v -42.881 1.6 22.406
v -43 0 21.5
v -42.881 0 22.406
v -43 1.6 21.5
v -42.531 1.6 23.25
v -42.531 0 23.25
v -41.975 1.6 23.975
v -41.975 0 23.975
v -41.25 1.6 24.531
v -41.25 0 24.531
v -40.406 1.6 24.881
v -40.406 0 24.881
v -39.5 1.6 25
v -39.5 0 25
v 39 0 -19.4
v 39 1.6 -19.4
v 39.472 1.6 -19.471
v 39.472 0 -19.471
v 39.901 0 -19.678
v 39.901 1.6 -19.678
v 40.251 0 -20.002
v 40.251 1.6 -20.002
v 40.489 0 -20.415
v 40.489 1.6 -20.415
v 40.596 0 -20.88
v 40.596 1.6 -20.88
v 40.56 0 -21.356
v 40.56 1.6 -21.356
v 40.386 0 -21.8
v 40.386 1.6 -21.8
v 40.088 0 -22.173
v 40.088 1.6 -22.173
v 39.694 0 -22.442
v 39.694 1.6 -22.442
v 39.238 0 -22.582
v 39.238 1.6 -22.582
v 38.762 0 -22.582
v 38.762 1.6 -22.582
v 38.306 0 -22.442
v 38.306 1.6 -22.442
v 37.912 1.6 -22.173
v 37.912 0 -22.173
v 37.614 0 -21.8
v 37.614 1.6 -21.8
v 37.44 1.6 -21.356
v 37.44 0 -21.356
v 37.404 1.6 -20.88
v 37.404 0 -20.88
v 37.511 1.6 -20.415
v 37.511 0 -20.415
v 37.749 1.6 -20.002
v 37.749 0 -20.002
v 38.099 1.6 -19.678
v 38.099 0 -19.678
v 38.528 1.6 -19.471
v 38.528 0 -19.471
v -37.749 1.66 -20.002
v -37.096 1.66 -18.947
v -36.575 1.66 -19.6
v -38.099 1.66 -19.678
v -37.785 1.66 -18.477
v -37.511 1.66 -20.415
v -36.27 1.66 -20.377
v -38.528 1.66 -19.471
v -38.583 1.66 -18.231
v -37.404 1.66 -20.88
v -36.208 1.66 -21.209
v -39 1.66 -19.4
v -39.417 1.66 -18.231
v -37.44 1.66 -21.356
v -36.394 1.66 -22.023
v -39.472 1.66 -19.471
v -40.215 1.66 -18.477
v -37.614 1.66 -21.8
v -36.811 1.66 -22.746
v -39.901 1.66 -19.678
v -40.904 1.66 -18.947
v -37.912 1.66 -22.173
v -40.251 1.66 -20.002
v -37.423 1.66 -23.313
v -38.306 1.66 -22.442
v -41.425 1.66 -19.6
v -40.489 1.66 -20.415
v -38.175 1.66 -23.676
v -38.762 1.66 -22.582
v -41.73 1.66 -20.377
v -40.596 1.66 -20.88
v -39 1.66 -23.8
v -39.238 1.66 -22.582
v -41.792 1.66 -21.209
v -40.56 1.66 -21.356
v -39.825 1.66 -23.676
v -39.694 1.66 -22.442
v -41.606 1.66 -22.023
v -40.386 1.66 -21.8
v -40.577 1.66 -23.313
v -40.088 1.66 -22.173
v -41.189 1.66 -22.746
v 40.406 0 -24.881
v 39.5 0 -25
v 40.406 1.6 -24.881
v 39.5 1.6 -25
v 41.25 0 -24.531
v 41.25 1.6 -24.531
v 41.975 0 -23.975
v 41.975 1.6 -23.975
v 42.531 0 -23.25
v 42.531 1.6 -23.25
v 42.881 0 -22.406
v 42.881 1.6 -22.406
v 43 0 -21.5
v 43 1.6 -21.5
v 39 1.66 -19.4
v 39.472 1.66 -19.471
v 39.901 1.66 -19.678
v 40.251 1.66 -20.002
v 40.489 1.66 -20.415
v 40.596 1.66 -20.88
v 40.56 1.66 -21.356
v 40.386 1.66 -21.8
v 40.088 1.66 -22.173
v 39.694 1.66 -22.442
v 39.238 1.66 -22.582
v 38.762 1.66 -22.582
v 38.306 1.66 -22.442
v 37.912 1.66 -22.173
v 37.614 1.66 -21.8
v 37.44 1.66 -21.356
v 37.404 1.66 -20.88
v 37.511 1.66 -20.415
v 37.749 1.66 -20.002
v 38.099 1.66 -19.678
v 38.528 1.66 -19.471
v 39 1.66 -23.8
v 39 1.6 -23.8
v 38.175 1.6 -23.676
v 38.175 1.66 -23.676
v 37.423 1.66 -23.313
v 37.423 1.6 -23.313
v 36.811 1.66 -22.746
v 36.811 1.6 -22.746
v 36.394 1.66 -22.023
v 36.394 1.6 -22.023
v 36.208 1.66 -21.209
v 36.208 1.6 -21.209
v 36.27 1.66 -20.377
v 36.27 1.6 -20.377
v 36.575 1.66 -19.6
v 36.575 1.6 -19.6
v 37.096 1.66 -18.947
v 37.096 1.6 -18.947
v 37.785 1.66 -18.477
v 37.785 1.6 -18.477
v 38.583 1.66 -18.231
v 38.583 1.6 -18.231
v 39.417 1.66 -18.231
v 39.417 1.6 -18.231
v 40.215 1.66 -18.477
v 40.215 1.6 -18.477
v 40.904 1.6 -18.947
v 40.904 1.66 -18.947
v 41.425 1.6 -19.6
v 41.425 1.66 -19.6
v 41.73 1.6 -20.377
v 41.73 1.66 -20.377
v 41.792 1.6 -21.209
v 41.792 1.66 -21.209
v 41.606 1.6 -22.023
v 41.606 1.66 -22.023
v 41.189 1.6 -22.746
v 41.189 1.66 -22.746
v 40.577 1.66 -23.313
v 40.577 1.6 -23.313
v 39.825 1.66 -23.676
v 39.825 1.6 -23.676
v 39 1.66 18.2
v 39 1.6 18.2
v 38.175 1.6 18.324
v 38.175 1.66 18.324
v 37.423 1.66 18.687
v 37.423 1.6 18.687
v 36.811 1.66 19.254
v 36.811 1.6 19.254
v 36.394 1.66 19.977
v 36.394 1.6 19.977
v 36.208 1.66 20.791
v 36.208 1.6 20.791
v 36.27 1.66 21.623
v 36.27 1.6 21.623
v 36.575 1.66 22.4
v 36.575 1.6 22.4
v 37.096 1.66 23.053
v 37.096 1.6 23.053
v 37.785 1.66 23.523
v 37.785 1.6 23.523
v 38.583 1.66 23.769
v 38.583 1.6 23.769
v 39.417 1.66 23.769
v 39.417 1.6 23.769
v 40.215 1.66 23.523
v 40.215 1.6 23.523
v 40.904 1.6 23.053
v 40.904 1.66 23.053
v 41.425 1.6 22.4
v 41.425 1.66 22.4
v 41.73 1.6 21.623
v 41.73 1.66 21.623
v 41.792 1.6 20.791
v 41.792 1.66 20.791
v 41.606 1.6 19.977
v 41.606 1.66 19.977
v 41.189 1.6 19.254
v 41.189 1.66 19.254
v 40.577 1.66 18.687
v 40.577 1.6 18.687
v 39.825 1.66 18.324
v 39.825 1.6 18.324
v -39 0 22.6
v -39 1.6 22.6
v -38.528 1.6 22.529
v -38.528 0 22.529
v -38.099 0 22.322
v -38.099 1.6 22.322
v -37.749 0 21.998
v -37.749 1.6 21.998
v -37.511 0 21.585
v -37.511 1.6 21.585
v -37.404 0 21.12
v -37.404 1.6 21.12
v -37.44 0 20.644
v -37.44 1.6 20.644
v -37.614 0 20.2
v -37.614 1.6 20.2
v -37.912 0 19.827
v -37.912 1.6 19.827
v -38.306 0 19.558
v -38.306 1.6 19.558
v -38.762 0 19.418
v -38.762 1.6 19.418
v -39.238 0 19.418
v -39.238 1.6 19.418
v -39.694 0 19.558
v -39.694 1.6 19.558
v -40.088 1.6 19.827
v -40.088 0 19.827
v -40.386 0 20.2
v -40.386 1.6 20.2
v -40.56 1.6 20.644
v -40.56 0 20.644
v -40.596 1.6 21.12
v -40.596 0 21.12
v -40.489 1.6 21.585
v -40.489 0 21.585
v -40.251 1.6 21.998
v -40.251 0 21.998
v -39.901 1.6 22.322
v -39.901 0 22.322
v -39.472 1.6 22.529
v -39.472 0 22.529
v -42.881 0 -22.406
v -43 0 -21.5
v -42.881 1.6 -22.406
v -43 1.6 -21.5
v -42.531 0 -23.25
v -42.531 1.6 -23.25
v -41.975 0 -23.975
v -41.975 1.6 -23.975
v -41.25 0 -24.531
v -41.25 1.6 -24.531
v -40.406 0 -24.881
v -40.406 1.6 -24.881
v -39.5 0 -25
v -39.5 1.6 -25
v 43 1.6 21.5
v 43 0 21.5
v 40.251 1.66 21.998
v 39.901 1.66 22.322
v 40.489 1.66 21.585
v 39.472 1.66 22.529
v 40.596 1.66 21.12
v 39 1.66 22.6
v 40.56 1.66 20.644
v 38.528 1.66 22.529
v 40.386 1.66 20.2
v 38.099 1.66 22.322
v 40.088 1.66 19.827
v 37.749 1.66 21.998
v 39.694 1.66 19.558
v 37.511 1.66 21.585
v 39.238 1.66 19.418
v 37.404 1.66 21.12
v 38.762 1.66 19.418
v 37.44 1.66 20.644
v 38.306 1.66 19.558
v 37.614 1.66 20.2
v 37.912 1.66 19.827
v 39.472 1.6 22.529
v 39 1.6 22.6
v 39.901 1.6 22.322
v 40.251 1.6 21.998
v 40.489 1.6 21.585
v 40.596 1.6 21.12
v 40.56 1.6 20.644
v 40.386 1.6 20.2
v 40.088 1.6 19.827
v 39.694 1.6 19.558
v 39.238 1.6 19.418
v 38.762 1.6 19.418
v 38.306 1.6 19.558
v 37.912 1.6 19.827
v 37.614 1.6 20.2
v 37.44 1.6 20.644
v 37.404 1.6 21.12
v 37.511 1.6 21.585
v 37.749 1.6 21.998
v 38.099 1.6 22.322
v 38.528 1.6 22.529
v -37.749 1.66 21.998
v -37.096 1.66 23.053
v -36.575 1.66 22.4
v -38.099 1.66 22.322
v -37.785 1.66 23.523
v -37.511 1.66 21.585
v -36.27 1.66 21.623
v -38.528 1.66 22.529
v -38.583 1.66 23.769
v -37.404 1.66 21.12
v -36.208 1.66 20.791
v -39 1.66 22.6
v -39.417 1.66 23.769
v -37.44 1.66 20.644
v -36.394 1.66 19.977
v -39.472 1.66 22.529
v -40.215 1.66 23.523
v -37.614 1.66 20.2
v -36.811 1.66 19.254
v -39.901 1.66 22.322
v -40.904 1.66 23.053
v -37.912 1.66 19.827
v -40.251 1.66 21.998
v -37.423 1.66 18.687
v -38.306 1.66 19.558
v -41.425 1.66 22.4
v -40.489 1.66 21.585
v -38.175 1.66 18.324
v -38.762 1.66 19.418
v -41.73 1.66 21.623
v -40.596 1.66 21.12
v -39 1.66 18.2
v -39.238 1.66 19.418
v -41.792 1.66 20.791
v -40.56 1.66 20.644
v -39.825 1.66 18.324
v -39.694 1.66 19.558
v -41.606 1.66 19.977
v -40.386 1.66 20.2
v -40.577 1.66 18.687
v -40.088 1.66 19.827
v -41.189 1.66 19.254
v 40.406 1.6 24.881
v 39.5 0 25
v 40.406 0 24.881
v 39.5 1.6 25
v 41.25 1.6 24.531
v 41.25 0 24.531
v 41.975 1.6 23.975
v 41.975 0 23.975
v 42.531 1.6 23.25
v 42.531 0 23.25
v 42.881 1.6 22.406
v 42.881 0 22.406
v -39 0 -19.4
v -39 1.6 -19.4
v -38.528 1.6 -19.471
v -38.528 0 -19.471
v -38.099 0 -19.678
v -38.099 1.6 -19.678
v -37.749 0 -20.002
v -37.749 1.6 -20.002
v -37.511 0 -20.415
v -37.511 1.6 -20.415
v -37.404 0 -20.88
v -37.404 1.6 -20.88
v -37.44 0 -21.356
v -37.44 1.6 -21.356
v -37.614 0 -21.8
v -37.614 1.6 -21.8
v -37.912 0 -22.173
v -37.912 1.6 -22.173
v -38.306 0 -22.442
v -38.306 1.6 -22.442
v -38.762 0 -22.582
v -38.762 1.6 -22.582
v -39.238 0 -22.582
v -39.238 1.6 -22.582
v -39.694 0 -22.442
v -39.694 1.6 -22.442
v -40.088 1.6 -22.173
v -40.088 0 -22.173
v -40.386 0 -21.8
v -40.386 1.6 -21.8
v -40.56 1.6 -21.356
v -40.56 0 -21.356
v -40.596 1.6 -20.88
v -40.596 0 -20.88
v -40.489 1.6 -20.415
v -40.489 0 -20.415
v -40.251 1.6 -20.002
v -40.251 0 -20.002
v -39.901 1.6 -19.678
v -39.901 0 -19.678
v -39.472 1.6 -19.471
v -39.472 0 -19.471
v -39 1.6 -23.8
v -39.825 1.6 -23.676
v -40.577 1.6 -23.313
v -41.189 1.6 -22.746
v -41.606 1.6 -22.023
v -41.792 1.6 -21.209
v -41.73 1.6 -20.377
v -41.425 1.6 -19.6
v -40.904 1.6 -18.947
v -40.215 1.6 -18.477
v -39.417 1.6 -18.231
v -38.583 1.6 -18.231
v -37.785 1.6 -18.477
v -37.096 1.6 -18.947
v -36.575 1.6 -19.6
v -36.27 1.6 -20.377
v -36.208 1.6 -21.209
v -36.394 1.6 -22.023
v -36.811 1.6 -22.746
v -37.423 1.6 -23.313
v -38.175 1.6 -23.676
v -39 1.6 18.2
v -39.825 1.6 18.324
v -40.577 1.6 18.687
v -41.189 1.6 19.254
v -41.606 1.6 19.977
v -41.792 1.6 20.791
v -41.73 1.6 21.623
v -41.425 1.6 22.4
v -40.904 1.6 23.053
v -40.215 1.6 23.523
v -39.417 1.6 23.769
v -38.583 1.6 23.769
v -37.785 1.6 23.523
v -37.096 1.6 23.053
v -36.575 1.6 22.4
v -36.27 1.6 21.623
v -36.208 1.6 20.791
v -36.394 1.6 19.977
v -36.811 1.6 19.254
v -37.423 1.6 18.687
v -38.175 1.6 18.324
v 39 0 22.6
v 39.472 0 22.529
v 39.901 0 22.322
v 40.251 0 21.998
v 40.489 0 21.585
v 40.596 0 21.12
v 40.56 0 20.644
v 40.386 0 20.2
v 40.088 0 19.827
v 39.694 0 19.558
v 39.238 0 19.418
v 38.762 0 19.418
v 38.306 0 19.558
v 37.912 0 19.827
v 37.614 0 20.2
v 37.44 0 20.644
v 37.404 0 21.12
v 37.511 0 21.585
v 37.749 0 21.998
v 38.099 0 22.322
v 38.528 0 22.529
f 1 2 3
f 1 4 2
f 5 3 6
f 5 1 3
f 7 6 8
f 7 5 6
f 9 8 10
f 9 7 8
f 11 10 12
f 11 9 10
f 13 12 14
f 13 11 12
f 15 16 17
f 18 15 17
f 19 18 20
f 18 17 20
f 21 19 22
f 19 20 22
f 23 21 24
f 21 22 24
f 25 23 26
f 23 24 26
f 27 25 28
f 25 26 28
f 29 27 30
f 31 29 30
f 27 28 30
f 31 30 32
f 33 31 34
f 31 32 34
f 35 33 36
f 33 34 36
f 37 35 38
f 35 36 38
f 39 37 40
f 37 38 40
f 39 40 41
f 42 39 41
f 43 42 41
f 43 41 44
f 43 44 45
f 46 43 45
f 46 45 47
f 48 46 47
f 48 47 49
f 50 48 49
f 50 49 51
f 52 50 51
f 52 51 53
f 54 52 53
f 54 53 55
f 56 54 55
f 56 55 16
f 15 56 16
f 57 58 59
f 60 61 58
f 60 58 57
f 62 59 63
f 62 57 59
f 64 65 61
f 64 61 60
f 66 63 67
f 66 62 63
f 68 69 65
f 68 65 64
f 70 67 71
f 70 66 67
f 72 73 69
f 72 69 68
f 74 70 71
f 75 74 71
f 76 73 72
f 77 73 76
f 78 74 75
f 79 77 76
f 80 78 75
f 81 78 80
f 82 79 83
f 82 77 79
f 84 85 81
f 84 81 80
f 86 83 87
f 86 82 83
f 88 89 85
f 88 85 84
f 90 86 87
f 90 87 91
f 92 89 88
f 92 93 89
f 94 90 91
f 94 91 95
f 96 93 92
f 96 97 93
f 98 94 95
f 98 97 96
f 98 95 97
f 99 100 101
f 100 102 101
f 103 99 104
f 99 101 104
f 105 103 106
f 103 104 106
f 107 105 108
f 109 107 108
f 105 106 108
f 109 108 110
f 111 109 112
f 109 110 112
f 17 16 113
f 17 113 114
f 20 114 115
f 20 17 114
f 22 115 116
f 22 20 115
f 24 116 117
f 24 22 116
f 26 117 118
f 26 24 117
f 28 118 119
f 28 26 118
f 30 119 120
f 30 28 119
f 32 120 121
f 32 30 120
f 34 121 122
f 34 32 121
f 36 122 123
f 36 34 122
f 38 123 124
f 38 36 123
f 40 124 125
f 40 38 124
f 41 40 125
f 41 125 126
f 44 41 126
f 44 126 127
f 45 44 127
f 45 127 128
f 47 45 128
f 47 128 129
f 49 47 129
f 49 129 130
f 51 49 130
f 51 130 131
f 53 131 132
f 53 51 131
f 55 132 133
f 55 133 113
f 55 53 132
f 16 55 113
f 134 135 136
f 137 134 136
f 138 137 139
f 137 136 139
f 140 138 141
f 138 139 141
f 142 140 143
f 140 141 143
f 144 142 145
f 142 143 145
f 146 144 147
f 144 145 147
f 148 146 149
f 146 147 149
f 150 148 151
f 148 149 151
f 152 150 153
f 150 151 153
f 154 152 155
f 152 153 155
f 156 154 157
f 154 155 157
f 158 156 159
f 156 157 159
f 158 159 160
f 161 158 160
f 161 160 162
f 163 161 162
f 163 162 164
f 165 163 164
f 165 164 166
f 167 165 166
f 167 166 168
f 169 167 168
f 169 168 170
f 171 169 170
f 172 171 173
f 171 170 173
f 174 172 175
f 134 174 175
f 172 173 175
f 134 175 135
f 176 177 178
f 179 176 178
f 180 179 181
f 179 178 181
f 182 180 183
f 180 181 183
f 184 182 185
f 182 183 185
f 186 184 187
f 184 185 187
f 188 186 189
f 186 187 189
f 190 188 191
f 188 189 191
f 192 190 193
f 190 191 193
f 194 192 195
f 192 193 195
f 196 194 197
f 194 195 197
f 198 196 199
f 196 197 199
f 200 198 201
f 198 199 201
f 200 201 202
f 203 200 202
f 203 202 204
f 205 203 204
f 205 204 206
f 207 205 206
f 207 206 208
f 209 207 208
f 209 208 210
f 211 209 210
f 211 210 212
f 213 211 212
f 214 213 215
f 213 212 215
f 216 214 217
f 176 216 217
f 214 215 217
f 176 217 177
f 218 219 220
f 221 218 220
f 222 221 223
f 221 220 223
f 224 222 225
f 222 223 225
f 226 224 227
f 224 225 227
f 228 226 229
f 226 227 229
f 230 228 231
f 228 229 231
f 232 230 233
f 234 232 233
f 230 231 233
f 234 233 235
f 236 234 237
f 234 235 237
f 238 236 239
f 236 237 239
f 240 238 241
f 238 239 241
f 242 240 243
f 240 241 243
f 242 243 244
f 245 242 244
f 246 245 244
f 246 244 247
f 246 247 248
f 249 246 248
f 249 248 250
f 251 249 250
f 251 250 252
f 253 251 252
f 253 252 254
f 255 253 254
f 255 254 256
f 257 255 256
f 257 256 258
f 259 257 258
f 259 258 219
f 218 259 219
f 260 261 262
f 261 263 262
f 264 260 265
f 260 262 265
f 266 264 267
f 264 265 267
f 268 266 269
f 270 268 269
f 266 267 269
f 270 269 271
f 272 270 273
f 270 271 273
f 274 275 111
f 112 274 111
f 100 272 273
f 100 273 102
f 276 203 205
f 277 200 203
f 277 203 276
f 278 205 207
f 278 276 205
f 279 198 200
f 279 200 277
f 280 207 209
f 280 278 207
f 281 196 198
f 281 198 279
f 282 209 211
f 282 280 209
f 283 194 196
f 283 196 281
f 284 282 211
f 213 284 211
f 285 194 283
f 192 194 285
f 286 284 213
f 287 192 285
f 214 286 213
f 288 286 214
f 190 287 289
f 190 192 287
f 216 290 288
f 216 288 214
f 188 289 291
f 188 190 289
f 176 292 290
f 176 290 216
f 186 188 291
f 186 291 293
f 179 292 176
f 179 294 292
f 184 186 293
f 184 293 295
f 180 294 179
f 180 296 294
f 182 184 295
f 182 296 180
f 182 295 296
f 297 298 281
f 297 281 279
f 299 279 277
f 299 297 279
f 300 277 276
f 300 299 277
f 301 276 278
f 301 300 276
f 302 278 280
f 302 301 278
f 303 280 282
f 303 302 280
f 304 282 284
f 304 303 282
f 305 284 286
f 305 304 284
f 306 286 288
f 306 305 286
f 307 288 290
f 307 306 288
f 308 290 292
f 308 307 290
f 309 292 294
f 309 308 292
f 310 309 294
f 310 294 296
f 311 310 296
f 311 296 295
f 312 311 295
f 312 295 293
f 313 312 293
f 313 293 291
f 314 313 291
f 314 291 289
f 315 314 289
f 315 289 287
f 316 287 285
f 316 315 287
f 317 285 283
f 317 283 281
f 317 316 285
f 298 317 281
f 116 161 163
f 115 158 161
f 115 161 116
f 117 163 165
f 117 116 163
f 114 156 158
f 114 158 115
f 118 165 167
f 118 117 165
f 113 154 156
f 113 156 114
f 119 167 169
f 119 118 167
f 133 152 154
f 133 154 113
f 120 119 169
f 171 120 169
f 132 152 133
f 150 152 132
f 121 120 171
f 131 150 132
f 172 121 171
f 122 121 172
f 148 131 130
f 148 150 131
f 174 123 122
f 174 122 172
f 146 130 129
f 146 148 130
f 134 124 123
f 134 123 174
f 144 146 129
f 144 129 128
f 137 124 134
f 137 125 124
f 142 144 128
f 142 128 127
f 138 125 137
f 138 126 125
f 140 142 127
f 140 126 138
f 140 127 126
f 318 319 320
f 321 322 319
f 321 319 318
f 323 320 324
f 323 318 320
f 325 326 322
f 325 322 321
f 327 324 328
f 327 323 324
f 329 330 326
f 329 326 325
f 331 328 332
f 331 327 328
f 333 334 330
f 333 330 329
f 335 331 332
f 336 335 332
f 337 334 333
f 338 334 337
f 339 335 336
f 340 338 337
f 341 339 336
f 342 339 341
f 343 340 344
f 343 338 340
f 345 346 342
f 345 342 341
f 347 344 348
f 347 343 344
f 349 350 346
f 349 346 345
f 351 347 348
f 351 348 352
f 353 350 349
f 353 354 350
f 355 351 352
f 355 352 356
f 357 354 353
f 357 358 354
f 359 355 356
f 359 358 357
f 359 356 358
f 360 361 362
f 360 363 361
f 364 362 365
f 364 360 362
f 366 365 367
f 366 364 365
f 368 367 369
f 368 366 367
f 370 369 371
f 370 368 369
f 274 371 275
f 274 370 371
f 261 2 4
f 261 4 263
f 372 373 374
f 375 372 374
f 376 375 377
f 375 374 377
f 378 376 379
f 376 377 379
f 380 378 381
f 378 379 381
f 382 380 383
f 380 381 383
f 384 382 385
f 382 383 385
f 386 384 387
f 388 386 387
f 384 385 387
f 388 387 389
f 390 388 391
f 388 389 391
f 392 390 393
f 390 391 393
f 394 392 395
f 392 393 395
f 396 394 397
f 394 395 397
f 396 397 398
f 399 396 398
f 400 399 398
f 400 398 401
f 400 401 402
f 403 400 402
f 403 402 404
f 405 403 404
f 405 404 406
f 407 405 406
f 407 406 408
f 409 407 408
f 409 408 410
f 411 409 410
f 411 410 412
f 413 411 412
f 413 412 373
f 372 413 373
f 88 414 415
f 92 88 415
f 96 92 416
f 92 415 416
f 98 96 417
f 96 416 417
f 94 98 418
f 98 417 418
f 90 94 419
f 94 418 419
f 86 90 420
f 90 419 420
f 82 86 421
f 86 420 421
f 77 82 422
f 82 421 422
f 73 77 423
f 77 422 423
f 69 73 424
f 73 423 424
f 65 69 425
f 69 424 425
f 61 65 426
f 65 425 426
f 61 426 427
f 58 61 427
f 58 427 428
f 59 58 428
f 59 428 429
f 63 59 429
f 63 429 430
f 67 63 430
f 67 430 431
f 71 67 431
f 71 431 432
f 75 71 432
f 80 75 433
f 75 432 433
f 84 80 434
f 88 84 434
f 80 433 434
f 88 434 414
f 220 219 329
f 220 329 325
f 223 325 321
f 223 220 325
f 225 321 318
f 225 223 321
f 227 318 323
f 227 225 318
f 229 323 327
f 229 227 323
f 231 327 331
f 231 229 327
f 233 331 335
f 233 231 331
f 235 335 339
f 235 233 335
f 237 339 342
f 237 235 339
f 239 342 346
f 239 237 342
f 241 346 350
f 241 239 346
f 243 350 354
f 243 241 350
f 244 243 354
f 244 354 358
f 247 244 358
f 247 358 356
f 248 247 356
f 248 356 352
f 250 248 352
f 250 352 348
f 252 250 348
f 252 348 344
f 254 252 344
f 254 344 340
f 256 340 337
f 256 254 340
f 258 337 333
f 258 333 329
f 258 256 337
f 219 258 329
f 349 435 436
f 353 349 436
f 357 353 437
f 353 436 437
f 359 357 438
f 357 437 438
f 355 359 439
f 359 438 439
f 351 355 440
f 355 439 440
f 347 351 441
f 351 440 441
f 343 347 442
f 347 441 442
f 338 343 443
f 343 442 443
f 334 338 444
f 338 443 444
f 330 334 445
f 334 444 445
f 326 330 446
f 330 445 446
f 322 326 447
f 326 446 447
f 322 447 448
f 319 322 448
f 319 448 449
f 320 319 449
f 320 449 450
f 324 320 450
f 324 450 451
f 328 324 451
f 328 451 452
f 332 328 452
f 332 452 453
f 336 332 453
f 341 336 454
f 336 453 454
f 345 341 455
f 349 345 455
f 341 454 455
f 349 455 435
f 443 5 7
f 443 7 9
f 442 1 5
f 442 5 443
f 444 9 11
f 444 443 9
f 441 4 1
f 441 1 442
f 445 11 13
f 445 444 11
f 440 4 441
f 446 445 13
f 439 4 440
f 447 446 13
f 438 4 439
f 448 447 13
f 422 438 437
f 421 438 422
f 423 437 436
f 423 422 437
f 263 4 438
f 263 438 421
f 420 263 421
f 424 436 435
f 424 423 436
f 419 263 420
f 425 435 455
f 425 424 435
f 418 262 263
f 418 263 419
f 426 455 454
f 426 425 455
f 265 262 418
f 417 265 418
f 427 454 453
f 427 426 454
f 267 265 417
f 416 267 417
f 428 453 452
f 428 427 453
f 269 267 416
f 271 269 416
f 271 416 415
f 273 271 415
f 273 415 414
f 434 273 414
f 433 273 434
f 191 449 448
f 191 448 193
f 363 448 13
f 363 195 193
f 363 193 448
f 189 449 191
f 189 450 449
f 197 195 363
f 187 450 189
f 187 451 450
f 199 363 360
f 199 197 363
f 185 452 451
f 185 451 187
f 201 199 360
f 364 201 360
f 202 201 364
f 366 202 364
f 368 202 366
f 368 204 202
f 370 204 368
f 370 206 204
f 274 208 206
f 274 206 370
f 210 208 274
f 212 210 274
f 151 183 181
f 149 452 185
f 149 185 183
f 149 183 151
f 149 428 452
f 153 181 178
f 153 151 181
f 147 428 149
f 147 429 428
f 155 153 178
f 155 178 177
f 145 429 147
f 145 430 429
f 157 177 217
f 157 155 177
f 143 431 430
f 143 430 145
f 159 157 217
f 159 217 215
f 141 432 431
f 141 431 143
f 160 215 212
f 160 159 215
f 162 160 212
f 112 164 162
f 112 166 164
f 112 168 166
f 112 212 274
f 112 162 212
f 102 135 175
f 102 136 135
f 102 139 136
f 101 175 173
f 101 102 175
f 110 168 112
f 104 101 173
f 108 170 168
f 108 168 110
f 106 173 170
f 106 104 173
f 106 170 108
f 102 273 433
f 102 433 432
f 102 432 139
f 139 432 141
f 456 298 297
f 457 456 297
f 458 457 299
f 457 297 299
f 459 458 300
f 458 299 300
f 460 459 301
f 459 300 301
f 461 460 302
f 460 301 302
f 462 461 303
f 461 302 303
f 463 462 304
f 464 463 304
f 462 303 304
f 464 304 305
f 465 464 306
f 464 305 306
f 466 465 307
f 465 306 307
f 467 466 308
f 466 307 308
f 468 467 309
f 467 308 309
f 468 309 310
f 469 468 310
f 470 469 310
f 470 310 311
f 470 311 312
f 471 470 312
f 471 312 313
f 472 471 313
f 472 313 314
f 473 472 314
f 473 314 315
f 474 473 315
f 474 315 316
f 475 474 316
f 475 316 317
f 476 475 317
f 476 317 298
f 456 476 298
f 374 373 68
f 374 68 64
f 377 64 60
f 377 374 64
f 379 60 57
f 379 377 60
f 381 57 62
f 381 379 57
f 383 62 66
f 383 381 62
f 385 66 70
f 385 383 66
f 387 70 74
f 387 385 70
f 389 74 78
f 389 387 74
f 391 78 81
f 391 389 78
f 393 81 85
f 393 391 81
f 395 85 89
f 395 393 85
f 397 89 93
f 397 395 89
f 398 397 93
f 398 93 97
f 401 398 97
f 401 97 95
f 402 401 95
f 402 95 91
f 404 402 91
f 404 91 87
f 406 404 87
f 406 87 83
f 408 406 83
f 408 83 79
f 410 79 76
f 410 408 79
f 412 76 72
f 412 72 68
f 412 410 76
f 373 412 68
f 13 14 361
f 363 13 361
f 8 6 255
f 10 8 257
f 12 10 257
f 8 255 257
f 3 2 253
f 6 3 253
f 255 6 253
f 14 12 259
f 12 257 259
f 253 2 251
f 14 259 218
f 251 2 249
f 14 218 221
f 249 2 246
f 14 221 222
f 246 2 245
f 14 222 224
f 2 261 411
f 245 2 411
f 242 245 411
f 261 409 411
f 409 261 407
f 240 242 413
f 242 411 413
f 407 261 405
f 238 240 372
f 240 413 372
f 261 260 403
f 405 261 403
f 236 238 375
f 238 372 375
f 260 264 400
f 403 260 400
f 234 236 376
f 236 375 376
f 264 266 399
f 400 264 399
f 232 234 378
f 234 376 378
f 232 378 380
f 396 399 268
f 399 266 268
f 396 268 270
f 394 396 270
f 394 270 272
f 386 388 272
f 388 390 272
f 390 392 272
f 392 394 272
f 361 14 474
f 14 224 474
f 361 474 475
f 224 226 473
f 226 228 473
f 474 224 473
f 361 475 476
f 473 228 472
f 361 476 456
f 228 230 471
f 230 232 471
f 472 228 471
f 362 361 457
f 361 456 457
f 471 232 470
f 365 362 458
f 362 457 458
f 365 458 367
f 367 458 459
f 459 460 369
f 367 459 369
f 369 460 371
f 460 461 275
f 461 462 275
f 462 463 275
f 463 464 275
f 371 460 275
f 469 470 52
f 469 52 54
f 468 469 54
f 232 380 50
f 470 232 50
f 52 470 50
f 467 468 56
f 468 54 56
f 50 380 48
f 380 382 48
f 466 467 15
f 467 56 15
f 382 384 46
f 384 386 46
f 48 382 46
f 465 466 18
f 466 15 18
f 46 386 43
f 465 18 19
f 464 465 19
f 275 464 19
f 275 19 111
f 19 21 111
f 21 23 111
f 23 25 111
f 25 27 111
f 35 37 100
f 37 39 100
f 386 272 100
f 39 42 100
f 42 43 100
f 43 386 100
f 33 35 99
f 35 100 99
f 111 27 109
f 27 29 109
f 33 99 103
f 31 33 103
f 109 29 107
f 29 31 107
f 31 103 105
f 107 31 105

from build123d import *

# Parameters (mm, degrees)
SKETCH_1_W          = 86
SKETCH_1_H          = 50
EXTRUDE_1_DEPTH     = 1.6
SKETCH_2_R          = 2.8
SKETCH_2_R_2        = 1.6
EXTRUDE_2_DEPTH     = 0.06
SKETCH_4_R          = 1.6
CUT_EXTRUDE_1_DEPTH = 50.765047975
FILLET_1_R          = 3.5


with BuildPart() as part:
    # 草图1 → 凸台-拉伸1 (new body)
    with BuildSketch(Plane(origin=(0, 0, 0), x_dir=(1, 0, 0), z_dir=(0, 1, 0))):
        Rectangle(SKETCH_1_W, SKETCH_1_H)
    extrude(amount=EXTRUDE_1_DEPTH)

    # 草图2 → 凸台-拉伸2 (add)
    # profile 1 of 4: a face of its own
    with BuildSketch(Plane(origin=(0, 1.6, 0), x_dir=(1, 0, 0), z_dir=(0, 1, 0))):
        with Locations(Location((-39, 21, 0), (0, 0, 90))):
            Circle(SKETCH_2_R)
        with Locations(Location((-39, 21, 0), (0, 0, 270))):
            Circle(SKETCH_2_R_2, mode=Mode.SUBTRACT)
    # profile 2 of 4: a face of its own
    with BuildSketch(Plane(origin=(0, 1.6, 0), x_dir=(1, 0, 0), z_dir=(0, 1, 0))):
        with Locations(Location((39, 21, 0), (0, 0, 90))):
            Circle(SKETCH_2_R)
        with Locations(Location((39, 21, 0), (0, 0, 270))):
            Circle(SKETCH_2_R_2, mode=Mode.SUBTRACT)
    # profile 3 of 4: a face of its own
    with BuildSketch(Plane(origin=(0, 1.6, 0), x_dir=(1, 0, 0), z_dir=(0, 1, 0))):
        with Locations(Location((39, -21, 0), (0, 0, 90))):
            Circle(SKETCH_2_R)
        with Locations(Location((39, -21, 0), (0, 0, 270))):
            Circle(SKETCH_2_R_2, mode=Mode.SUBTRACT)
    # profile 4 of 4: a face of its own
    with BuildSketch(Plane(origin=(0, 1.6, 0), x_dir=(1, 0, 0), z_dir=(0, 1, 0))):
        with Locations(Location((-39, -21, 0), (0, 0, 90))):
            Circle(SKETCH_2_R)
        with Locations(Location((-39, -21, 0), (0, 0, 270))):
            Circle(SKETCH_2_R_2, mode=Mode.SUBTRACT)
    extrude(amount=EXTRUDE_2_DEPTH)

    # 草图4 → 切除-拉伸1 (cut, through all)
    with BuildSketch(Plane(origin=(0, 1.6, 0), x_dir=(1, 0, 0), z_dir=(0, 1, 0))):
        with Locations(Location((-39, 21, 0), (0, 0, 270))):
            Circle(SKETCH_4_R)
        with Locations(Location((39, 21, 0), (0, 0, 270))):
            Circle(SKETCH_4_R)
        with Locations(Location((39, -21, 0), (0, 0, 270))):
            Circle(SKETCH_4_R)
        with Locations(Location((-39, -21, 0), (0, 0, 270))):
            Circle(SKETCH_4_R)
    extrude(amount=-CUT_EXTRUDE_1_DEPTH, mode=Mode.SUBTRACT)

    # 圆角1
    fillet_1_edges = [part.edges().sort_by_distance(p)[0] for p in [
        (43, 0.8, 25),
        (-43, 0.8, 25),
        (-43, 0.8, -25),
        (43, 0.8, -25),
    ]]
    fillet(fillet_1_edges, radius=FILLET_1_R)


solid = part.part
